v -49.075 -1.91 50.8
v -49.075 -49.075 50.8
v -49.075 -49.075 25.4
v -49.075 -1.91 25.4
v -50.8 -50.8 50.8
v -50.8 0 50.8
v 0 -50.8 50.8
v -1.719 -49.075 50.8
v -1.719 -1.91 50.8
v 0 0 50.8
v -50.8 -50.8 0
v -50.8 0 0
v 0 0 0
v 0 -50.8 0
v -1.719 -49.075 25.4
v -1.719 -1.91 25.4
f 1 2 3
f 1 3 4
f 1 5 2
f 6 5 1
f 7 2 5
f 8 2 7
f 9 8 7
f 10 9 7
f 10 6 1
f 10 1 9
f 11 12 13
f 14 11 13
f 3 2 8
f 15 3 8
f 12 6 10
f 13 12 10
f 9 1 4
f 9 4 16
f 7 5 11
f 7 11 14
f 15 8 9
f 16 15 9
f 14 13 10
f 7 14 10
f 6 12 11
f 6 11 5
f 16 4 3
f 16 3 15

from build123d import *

# Parameters (mm, degrees)
F0_W     = 50.8
F0_H     = 50.8
F1_DEPTH = 50.8
F2_W     = 47.356754
F2_H     = 47.165799
F3_DEPTH = 25.4


with BuildPart() as f1:
    # F0 (on Front) → F1 (new body)
    with BuildSketch(Plane.XZ):
        with Locations((-25.4, 25.4)):
            Rectangle(F0_W, F0_H)
    extrude(amount=F1_DEPTH)

    # F2 (on face) → F3 (cut)
    with BuildSketch(Plane.XY.offset(50.8)):
        with Locations((-25.396969, -25.492446)):
            Rectangle(F2_W, F2_H)
    extrude(amount=-F3_DEPTH, mode=Mode.SUBTRACT)


solid = f1.part
